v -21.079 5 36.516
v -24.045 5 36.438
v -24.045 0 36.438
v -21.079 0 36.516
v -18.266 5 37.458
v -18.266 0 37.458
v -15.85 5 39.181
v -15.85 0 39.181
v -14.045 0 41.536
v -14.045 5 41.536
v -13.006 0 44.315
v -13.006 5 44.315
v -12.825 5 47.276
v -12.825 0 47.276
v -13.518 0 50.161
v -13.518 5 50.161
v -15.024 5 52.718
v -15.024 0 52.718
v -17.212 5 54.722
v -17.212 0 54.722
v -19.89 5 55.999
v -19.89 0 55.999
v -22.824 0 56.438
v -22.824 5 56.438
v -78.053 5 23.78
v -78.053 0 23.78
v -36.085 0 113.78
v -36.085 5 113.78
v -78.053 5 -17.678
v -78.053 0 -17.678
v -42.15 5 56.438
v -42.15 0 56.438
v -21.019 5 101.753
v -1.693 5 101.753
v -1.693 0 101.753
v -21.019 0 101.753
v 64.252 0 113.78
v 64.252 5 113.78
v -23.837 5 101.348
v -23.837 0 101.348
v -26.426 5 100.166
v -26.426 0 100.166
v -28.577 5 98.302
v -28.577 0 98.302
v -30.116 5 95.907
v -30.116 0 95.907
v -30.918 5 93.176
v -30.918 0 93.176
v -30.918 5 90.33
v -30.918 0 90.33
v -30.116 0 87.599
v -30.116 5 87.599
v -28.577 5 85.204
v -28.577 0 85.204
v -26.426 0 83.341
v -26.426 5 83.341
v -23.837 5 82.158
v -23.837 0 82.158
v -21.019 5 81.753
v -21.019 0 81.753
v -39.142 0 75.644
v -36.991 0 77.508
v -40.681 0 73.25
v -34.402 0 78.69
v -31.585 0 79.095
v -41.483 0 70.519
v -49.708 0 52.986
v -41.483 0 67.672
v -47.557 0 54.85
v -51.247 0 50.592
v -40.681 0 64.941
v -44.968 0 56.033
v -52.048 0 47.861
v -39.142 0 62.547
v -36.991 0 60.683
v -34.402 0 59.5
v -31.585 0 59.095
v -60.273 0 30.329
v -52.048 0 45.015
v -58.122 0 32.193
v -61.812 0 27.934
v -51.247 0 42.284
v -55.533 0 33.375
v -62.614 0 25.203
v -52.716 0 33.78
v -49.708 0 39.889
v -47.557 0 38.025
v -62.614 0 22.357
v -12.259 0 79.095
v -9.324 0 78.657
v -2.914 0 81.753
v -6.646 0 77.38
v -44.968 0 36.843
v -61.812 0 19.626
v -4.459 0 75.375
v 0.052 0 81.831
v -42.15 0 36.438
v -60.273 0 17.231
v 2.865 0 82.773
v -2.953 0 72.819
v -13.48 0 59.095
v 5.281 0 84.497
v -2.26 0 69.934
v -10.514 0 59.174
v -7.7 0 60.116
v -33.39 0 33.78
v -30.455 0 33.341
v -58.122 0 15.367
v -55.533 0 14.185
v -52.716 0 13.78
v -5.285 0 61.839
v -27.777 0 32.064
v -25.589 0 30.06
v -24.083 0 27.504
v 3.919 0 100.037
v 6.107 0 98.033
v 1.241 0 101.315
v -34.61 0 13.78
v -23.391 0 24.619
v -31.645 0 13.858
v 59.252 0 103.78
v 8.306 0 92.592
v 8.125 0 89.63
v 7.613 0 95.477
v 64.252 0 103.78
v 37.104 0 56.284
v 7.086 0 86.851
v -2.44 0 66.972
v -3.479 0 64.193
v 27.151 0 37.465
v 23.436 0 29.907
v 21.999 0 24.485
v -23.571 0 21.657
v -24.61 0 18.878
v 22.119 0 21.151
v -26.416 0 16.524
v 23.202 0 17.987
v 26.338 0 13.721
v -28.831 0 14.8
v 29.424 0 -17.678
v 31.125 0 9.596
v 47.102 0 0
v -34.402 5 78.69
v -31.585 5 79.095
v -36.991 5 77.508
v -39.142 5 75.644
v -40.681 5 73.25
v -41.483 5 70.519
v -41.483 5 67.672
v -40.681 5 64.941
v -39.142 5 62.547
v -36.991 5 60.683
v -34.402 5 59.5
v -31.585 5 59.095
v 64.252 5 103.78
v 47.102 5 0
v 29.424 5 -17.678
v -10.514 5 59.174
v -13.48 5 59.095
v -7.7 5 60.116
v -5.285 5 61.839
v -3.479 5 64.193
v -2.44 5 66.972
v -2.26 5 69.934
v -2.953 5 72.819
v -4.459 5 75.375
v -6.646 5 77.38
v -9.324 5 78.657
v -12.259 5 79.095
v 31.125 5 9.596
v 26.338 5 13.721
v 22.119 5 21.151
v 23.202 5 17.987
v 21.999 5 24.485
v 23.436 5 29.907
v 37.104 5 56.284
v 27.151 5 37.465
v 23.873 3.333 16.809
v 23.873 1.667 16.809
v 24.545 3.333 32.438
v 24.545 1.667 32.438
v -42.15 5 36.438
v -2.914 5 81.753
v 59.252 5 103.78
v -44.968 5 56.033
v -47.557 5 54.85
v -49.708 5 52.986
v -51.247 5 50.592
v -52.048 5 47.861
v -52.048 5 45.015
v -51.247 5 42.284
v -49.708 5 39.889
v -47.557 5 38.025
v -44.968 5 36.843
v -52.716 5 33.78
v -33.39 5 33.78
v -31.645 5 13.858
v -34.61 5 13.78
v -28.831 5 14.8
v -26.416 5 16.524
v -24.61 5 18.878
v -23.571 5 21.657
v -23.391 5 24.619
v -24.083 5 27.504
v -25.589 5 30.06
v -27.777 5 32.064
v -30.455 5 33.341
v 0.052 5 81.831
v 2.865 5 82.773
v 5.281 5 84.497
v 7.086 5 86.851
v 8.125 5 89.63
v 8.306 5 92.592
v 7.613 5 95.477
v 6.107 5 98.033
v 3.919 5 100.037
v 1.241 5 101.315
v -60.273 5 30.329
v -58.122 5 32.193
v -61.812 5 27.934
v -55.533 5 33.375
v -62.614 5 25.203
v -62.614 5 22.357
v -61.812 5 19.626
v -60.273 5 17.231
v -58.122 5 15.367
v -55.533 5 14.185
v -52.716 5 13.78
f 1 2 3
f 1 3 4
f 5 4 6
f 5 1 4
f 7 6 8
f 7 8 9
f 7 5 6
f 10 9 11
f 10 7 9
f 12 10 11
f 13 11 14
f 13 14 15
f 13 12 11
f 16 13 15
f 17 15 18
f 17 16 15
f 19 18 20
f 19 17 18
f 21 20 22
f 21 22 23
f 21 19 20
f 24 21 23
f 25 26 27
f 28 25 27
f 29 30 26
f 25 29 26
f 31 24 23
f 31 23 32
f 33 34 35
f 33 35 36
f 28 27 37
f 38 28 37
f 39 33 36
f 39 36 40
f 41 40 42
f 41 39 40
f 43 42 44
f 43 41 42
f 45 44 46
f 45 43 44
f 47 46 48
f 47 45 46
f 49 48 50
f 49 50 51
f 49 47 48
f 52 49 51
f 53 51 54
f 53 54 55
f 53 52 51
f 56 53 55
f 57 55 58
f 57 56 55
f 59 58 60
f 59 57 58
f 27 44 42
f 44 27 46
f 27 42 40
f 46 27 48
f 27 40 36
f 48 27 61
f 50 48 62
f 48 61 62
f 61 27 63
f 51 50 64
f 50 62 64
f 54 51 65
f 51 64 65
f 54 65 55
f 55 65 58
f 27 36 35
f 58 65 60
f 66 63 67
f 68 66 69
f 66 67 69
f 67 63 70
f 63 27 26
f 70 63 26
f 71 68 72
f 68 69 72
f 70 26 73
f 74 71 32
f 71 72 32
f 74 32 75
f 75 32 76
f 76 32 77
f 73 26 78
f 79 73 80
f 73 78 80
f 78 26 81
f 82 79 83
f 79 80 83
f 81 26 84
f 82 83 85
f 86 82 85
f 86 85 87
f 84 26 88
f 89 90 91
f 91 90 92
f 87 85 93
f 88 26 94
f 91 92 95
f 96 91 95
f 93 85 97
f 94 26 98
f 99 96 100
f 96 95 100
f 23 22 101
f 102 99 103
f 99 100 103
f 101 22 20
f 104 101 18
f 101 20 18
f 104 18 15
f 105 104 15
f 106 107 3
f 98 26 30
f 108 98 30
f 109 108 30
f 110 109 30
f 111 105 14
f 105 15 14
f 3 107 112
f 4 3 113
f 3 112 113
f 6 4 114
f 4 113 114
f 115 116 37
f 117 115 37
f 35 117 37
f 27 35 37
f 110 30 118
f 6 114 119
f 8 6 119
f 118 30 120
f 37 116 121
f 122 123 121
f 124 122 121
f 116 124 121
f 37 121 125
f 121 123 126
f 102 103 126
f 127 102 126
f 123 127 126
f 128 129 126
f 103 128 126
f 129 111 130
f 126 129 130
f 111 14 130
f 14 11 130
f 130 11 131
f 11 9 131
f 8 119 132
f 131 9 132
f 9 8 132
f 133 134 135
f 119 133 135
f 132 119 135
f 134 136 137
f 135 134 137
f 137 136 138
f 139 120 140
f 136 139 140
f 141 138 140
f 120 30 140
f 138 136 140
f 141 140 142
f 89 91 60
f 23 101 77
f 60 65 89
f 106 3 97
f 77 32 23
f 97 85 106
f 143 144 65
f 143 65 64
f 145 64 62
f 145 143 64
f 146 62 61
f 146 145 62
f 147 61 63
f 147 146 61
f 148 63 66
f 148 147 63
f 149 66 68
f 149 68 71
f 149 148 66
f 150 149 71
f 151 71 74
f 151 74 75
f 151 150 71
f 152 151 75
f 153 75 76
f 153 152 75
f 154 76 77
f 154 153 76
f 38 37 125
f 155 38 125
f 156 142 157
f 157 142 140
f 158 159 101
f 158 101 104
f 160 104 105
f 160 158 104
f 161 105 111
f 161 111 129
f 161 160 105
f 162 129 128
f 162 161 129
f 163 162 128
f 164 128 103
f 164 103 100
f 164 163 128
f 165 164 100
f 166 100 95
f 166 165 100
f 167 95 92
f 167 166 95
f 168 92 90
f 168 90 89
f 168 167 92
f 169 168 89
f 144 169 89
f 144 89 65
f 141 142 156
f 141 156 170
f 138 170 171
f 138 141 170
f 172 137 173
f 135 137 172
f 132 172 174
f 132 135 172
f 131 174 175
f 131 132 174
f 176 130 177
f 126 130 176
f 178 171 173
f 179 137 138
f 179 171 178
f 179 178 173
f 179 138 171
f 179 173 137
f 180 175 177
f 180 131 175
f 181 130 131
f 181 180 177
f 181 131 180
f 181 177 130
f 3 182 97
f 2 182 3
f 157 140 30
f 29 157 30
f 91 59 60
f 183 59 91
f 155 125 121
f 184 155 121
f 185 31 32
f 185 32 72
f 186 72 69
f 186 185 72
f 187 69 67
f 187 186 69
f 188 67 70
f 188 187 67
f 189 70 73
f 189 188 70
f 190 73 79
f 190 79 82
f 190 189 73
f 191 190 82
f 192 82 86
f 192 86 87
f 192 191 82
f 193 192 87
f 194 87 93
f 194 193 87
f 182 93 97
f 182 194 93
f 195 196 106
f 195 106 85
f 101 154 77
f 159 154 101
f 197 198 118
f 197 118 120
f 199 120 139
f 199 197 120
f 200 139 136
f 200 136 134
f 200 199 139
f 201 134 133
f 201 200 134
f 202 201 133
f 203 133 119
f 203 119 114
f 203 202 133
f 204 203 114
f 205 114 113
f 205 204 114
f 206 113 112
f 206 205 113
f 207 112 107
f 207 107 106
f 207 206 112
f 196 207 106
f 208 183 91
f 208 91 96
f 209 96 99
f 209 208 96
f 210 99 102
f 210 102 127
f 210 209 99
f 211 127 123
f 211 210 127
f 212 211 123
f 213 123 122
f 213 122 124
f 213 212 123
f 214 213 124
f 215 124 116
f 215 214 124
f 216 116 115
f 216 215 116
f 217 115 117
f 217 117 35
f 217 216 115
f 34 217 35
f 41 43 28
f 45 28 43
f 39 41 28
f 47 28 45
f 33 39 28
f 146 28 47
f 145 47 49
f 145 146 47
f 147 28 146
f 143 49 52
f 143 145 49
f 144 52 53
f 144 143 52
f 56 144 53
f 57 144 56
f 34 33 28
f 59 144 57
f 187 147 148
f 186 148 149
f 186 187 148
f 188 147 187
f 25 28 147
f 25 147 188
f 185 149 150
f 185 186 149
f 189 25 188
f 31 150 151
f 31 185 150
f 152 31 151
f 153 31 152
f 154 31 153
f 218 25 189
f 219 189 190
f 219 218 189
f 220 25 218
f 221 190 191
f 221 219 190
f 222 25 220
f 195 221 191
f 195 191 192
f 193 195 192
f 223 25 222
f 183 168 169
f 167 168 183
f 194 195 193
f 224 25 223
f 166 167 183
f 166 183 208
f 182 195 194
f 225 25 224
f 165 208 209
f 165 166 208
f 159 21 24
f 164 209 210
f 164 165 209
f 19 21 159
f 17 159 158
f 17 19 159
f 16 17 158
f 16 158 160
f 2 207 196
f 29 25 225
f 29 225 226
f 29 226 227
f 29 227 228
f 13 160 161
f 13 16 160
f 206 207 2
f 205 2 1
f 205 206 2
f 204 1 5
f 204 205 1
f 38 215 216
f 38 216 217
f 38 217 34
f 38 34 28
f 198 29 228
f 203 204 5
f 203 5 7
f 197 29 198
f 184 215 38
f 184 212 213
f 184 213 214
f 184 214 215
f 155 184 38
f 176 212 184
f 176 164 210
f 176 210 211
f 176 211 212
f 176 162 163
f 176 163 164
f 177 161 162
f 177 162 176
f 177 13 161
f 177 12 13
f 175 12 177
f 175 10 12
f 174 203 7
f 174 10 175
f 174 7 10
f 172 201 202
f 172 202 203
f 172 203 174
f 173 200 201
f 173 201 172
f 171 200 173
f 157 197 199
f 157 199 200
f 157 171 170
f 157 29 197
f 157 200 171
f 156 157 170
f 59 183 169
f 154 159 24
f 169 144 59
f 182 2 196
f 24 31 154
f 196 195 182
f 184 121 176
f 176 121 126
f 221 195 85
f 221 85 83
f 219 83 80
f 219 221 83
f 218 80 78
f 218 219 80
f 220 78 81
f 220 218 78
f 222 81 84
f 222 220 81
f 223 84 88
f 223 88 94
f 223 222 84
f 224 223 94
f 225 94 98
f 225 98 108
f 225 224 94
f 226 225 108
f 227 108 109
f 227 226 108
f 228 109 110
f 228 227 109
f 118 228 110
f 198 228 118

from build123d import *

# Parameters (mm, degrees)
BOSS_EXTRUDE1_DEPTH = 5
CUT_EXTRUDE1_DEPTH  = 5
CRVPATTERN1_COUNT   = 4
CRVPATTERN1_PITCH   = 25


with BuildPart() as part:
    # Sketch1 → Boss-Extrude1 (new body)
    with BuildSketch(Plane(origin=(0, 0, 0), x_dir=(1, 0, 0), z_dir=(0, 1, 0))):
        with BuildLine():
            Line((29.424030449, 17.67766953), (-78.052582598, 17.67766953))
            Line((-78.052582598, 17.67766953), (-78.052582598, -23.77998841))
            Line((-78.052582598, -23.77998841), (-36.084893364, -113.77998841))
            Line((-36.084893364, -113.77998841), (64.252030054, -113.77998841))
            Line((64.252030054, -113.77998841), (64.252030054, -103.77998841))
            Line((64.252030054, -103.77998841), (59.252030054, -103.77998841))
            Line((59.252030054, -103.77998841), (37.104377349, -56.284193911))
            add(Edge.make_bspline(
                [(47.101699979, 0), (7.916375449, -20.532992836), (22.607602938, -25.195760862), (37.104377349, -56.284193911)],
                knots=[0, 0, 0, 0, 1, 1, 1, 1], degree=3))
            Line((47.101699979, 0), (29.424030449, 17.67766953))
        make_face()
    extrude(amount=BOSS_EXTRUDE1_DEPTH)

    # Sketch2 → Cut-Extrude1 (cut)
    with BuildSketch(Plane(origin=(0, 5, 0), x_dir=(1, 0, 0), z_dir=(0, 1, 0))):
        with BuildLine():
            Line((-52.71565918, -13.77998841), (-42.71565918, -13.77998841))
            Line((-42.71565918, -13.77998841), (-34.610479114, -13.77998841))
            ThreePointArc((-34.610479114, -13.77998841), (-23.370888656, -23.131095914), (-33.389506017, -33.77998841))
            Line((-33.389506017, -33.77998841), (-43.389506017, -33.77998841))
            Line((-43.389506017, -33.77998841), (-52.71565918, -33.77998841))
            ThreePointArc((-52.71565918, -33.77998841), (-62.71565918, -23.77998841), (-52.71565918, -13.77998841))
        make_face()
    cut_extrude1 = extrude(amount=-CUT_EXTRUDE1_DEPTH, mode=Mode.SUBTRACT)

    # CrvPattern1: Cut-Extrude1 ×4
    with Locations(*[Vector(0.4226182619677251, 0, 0.9063077869307863) * (i * CRVPATTERN1_PITCH) for i in range(1, CRVPATTERN1_COUNT)]):
        add(cut_extrude1, mode=Mode.SUBTRACT)


solid = part.part
